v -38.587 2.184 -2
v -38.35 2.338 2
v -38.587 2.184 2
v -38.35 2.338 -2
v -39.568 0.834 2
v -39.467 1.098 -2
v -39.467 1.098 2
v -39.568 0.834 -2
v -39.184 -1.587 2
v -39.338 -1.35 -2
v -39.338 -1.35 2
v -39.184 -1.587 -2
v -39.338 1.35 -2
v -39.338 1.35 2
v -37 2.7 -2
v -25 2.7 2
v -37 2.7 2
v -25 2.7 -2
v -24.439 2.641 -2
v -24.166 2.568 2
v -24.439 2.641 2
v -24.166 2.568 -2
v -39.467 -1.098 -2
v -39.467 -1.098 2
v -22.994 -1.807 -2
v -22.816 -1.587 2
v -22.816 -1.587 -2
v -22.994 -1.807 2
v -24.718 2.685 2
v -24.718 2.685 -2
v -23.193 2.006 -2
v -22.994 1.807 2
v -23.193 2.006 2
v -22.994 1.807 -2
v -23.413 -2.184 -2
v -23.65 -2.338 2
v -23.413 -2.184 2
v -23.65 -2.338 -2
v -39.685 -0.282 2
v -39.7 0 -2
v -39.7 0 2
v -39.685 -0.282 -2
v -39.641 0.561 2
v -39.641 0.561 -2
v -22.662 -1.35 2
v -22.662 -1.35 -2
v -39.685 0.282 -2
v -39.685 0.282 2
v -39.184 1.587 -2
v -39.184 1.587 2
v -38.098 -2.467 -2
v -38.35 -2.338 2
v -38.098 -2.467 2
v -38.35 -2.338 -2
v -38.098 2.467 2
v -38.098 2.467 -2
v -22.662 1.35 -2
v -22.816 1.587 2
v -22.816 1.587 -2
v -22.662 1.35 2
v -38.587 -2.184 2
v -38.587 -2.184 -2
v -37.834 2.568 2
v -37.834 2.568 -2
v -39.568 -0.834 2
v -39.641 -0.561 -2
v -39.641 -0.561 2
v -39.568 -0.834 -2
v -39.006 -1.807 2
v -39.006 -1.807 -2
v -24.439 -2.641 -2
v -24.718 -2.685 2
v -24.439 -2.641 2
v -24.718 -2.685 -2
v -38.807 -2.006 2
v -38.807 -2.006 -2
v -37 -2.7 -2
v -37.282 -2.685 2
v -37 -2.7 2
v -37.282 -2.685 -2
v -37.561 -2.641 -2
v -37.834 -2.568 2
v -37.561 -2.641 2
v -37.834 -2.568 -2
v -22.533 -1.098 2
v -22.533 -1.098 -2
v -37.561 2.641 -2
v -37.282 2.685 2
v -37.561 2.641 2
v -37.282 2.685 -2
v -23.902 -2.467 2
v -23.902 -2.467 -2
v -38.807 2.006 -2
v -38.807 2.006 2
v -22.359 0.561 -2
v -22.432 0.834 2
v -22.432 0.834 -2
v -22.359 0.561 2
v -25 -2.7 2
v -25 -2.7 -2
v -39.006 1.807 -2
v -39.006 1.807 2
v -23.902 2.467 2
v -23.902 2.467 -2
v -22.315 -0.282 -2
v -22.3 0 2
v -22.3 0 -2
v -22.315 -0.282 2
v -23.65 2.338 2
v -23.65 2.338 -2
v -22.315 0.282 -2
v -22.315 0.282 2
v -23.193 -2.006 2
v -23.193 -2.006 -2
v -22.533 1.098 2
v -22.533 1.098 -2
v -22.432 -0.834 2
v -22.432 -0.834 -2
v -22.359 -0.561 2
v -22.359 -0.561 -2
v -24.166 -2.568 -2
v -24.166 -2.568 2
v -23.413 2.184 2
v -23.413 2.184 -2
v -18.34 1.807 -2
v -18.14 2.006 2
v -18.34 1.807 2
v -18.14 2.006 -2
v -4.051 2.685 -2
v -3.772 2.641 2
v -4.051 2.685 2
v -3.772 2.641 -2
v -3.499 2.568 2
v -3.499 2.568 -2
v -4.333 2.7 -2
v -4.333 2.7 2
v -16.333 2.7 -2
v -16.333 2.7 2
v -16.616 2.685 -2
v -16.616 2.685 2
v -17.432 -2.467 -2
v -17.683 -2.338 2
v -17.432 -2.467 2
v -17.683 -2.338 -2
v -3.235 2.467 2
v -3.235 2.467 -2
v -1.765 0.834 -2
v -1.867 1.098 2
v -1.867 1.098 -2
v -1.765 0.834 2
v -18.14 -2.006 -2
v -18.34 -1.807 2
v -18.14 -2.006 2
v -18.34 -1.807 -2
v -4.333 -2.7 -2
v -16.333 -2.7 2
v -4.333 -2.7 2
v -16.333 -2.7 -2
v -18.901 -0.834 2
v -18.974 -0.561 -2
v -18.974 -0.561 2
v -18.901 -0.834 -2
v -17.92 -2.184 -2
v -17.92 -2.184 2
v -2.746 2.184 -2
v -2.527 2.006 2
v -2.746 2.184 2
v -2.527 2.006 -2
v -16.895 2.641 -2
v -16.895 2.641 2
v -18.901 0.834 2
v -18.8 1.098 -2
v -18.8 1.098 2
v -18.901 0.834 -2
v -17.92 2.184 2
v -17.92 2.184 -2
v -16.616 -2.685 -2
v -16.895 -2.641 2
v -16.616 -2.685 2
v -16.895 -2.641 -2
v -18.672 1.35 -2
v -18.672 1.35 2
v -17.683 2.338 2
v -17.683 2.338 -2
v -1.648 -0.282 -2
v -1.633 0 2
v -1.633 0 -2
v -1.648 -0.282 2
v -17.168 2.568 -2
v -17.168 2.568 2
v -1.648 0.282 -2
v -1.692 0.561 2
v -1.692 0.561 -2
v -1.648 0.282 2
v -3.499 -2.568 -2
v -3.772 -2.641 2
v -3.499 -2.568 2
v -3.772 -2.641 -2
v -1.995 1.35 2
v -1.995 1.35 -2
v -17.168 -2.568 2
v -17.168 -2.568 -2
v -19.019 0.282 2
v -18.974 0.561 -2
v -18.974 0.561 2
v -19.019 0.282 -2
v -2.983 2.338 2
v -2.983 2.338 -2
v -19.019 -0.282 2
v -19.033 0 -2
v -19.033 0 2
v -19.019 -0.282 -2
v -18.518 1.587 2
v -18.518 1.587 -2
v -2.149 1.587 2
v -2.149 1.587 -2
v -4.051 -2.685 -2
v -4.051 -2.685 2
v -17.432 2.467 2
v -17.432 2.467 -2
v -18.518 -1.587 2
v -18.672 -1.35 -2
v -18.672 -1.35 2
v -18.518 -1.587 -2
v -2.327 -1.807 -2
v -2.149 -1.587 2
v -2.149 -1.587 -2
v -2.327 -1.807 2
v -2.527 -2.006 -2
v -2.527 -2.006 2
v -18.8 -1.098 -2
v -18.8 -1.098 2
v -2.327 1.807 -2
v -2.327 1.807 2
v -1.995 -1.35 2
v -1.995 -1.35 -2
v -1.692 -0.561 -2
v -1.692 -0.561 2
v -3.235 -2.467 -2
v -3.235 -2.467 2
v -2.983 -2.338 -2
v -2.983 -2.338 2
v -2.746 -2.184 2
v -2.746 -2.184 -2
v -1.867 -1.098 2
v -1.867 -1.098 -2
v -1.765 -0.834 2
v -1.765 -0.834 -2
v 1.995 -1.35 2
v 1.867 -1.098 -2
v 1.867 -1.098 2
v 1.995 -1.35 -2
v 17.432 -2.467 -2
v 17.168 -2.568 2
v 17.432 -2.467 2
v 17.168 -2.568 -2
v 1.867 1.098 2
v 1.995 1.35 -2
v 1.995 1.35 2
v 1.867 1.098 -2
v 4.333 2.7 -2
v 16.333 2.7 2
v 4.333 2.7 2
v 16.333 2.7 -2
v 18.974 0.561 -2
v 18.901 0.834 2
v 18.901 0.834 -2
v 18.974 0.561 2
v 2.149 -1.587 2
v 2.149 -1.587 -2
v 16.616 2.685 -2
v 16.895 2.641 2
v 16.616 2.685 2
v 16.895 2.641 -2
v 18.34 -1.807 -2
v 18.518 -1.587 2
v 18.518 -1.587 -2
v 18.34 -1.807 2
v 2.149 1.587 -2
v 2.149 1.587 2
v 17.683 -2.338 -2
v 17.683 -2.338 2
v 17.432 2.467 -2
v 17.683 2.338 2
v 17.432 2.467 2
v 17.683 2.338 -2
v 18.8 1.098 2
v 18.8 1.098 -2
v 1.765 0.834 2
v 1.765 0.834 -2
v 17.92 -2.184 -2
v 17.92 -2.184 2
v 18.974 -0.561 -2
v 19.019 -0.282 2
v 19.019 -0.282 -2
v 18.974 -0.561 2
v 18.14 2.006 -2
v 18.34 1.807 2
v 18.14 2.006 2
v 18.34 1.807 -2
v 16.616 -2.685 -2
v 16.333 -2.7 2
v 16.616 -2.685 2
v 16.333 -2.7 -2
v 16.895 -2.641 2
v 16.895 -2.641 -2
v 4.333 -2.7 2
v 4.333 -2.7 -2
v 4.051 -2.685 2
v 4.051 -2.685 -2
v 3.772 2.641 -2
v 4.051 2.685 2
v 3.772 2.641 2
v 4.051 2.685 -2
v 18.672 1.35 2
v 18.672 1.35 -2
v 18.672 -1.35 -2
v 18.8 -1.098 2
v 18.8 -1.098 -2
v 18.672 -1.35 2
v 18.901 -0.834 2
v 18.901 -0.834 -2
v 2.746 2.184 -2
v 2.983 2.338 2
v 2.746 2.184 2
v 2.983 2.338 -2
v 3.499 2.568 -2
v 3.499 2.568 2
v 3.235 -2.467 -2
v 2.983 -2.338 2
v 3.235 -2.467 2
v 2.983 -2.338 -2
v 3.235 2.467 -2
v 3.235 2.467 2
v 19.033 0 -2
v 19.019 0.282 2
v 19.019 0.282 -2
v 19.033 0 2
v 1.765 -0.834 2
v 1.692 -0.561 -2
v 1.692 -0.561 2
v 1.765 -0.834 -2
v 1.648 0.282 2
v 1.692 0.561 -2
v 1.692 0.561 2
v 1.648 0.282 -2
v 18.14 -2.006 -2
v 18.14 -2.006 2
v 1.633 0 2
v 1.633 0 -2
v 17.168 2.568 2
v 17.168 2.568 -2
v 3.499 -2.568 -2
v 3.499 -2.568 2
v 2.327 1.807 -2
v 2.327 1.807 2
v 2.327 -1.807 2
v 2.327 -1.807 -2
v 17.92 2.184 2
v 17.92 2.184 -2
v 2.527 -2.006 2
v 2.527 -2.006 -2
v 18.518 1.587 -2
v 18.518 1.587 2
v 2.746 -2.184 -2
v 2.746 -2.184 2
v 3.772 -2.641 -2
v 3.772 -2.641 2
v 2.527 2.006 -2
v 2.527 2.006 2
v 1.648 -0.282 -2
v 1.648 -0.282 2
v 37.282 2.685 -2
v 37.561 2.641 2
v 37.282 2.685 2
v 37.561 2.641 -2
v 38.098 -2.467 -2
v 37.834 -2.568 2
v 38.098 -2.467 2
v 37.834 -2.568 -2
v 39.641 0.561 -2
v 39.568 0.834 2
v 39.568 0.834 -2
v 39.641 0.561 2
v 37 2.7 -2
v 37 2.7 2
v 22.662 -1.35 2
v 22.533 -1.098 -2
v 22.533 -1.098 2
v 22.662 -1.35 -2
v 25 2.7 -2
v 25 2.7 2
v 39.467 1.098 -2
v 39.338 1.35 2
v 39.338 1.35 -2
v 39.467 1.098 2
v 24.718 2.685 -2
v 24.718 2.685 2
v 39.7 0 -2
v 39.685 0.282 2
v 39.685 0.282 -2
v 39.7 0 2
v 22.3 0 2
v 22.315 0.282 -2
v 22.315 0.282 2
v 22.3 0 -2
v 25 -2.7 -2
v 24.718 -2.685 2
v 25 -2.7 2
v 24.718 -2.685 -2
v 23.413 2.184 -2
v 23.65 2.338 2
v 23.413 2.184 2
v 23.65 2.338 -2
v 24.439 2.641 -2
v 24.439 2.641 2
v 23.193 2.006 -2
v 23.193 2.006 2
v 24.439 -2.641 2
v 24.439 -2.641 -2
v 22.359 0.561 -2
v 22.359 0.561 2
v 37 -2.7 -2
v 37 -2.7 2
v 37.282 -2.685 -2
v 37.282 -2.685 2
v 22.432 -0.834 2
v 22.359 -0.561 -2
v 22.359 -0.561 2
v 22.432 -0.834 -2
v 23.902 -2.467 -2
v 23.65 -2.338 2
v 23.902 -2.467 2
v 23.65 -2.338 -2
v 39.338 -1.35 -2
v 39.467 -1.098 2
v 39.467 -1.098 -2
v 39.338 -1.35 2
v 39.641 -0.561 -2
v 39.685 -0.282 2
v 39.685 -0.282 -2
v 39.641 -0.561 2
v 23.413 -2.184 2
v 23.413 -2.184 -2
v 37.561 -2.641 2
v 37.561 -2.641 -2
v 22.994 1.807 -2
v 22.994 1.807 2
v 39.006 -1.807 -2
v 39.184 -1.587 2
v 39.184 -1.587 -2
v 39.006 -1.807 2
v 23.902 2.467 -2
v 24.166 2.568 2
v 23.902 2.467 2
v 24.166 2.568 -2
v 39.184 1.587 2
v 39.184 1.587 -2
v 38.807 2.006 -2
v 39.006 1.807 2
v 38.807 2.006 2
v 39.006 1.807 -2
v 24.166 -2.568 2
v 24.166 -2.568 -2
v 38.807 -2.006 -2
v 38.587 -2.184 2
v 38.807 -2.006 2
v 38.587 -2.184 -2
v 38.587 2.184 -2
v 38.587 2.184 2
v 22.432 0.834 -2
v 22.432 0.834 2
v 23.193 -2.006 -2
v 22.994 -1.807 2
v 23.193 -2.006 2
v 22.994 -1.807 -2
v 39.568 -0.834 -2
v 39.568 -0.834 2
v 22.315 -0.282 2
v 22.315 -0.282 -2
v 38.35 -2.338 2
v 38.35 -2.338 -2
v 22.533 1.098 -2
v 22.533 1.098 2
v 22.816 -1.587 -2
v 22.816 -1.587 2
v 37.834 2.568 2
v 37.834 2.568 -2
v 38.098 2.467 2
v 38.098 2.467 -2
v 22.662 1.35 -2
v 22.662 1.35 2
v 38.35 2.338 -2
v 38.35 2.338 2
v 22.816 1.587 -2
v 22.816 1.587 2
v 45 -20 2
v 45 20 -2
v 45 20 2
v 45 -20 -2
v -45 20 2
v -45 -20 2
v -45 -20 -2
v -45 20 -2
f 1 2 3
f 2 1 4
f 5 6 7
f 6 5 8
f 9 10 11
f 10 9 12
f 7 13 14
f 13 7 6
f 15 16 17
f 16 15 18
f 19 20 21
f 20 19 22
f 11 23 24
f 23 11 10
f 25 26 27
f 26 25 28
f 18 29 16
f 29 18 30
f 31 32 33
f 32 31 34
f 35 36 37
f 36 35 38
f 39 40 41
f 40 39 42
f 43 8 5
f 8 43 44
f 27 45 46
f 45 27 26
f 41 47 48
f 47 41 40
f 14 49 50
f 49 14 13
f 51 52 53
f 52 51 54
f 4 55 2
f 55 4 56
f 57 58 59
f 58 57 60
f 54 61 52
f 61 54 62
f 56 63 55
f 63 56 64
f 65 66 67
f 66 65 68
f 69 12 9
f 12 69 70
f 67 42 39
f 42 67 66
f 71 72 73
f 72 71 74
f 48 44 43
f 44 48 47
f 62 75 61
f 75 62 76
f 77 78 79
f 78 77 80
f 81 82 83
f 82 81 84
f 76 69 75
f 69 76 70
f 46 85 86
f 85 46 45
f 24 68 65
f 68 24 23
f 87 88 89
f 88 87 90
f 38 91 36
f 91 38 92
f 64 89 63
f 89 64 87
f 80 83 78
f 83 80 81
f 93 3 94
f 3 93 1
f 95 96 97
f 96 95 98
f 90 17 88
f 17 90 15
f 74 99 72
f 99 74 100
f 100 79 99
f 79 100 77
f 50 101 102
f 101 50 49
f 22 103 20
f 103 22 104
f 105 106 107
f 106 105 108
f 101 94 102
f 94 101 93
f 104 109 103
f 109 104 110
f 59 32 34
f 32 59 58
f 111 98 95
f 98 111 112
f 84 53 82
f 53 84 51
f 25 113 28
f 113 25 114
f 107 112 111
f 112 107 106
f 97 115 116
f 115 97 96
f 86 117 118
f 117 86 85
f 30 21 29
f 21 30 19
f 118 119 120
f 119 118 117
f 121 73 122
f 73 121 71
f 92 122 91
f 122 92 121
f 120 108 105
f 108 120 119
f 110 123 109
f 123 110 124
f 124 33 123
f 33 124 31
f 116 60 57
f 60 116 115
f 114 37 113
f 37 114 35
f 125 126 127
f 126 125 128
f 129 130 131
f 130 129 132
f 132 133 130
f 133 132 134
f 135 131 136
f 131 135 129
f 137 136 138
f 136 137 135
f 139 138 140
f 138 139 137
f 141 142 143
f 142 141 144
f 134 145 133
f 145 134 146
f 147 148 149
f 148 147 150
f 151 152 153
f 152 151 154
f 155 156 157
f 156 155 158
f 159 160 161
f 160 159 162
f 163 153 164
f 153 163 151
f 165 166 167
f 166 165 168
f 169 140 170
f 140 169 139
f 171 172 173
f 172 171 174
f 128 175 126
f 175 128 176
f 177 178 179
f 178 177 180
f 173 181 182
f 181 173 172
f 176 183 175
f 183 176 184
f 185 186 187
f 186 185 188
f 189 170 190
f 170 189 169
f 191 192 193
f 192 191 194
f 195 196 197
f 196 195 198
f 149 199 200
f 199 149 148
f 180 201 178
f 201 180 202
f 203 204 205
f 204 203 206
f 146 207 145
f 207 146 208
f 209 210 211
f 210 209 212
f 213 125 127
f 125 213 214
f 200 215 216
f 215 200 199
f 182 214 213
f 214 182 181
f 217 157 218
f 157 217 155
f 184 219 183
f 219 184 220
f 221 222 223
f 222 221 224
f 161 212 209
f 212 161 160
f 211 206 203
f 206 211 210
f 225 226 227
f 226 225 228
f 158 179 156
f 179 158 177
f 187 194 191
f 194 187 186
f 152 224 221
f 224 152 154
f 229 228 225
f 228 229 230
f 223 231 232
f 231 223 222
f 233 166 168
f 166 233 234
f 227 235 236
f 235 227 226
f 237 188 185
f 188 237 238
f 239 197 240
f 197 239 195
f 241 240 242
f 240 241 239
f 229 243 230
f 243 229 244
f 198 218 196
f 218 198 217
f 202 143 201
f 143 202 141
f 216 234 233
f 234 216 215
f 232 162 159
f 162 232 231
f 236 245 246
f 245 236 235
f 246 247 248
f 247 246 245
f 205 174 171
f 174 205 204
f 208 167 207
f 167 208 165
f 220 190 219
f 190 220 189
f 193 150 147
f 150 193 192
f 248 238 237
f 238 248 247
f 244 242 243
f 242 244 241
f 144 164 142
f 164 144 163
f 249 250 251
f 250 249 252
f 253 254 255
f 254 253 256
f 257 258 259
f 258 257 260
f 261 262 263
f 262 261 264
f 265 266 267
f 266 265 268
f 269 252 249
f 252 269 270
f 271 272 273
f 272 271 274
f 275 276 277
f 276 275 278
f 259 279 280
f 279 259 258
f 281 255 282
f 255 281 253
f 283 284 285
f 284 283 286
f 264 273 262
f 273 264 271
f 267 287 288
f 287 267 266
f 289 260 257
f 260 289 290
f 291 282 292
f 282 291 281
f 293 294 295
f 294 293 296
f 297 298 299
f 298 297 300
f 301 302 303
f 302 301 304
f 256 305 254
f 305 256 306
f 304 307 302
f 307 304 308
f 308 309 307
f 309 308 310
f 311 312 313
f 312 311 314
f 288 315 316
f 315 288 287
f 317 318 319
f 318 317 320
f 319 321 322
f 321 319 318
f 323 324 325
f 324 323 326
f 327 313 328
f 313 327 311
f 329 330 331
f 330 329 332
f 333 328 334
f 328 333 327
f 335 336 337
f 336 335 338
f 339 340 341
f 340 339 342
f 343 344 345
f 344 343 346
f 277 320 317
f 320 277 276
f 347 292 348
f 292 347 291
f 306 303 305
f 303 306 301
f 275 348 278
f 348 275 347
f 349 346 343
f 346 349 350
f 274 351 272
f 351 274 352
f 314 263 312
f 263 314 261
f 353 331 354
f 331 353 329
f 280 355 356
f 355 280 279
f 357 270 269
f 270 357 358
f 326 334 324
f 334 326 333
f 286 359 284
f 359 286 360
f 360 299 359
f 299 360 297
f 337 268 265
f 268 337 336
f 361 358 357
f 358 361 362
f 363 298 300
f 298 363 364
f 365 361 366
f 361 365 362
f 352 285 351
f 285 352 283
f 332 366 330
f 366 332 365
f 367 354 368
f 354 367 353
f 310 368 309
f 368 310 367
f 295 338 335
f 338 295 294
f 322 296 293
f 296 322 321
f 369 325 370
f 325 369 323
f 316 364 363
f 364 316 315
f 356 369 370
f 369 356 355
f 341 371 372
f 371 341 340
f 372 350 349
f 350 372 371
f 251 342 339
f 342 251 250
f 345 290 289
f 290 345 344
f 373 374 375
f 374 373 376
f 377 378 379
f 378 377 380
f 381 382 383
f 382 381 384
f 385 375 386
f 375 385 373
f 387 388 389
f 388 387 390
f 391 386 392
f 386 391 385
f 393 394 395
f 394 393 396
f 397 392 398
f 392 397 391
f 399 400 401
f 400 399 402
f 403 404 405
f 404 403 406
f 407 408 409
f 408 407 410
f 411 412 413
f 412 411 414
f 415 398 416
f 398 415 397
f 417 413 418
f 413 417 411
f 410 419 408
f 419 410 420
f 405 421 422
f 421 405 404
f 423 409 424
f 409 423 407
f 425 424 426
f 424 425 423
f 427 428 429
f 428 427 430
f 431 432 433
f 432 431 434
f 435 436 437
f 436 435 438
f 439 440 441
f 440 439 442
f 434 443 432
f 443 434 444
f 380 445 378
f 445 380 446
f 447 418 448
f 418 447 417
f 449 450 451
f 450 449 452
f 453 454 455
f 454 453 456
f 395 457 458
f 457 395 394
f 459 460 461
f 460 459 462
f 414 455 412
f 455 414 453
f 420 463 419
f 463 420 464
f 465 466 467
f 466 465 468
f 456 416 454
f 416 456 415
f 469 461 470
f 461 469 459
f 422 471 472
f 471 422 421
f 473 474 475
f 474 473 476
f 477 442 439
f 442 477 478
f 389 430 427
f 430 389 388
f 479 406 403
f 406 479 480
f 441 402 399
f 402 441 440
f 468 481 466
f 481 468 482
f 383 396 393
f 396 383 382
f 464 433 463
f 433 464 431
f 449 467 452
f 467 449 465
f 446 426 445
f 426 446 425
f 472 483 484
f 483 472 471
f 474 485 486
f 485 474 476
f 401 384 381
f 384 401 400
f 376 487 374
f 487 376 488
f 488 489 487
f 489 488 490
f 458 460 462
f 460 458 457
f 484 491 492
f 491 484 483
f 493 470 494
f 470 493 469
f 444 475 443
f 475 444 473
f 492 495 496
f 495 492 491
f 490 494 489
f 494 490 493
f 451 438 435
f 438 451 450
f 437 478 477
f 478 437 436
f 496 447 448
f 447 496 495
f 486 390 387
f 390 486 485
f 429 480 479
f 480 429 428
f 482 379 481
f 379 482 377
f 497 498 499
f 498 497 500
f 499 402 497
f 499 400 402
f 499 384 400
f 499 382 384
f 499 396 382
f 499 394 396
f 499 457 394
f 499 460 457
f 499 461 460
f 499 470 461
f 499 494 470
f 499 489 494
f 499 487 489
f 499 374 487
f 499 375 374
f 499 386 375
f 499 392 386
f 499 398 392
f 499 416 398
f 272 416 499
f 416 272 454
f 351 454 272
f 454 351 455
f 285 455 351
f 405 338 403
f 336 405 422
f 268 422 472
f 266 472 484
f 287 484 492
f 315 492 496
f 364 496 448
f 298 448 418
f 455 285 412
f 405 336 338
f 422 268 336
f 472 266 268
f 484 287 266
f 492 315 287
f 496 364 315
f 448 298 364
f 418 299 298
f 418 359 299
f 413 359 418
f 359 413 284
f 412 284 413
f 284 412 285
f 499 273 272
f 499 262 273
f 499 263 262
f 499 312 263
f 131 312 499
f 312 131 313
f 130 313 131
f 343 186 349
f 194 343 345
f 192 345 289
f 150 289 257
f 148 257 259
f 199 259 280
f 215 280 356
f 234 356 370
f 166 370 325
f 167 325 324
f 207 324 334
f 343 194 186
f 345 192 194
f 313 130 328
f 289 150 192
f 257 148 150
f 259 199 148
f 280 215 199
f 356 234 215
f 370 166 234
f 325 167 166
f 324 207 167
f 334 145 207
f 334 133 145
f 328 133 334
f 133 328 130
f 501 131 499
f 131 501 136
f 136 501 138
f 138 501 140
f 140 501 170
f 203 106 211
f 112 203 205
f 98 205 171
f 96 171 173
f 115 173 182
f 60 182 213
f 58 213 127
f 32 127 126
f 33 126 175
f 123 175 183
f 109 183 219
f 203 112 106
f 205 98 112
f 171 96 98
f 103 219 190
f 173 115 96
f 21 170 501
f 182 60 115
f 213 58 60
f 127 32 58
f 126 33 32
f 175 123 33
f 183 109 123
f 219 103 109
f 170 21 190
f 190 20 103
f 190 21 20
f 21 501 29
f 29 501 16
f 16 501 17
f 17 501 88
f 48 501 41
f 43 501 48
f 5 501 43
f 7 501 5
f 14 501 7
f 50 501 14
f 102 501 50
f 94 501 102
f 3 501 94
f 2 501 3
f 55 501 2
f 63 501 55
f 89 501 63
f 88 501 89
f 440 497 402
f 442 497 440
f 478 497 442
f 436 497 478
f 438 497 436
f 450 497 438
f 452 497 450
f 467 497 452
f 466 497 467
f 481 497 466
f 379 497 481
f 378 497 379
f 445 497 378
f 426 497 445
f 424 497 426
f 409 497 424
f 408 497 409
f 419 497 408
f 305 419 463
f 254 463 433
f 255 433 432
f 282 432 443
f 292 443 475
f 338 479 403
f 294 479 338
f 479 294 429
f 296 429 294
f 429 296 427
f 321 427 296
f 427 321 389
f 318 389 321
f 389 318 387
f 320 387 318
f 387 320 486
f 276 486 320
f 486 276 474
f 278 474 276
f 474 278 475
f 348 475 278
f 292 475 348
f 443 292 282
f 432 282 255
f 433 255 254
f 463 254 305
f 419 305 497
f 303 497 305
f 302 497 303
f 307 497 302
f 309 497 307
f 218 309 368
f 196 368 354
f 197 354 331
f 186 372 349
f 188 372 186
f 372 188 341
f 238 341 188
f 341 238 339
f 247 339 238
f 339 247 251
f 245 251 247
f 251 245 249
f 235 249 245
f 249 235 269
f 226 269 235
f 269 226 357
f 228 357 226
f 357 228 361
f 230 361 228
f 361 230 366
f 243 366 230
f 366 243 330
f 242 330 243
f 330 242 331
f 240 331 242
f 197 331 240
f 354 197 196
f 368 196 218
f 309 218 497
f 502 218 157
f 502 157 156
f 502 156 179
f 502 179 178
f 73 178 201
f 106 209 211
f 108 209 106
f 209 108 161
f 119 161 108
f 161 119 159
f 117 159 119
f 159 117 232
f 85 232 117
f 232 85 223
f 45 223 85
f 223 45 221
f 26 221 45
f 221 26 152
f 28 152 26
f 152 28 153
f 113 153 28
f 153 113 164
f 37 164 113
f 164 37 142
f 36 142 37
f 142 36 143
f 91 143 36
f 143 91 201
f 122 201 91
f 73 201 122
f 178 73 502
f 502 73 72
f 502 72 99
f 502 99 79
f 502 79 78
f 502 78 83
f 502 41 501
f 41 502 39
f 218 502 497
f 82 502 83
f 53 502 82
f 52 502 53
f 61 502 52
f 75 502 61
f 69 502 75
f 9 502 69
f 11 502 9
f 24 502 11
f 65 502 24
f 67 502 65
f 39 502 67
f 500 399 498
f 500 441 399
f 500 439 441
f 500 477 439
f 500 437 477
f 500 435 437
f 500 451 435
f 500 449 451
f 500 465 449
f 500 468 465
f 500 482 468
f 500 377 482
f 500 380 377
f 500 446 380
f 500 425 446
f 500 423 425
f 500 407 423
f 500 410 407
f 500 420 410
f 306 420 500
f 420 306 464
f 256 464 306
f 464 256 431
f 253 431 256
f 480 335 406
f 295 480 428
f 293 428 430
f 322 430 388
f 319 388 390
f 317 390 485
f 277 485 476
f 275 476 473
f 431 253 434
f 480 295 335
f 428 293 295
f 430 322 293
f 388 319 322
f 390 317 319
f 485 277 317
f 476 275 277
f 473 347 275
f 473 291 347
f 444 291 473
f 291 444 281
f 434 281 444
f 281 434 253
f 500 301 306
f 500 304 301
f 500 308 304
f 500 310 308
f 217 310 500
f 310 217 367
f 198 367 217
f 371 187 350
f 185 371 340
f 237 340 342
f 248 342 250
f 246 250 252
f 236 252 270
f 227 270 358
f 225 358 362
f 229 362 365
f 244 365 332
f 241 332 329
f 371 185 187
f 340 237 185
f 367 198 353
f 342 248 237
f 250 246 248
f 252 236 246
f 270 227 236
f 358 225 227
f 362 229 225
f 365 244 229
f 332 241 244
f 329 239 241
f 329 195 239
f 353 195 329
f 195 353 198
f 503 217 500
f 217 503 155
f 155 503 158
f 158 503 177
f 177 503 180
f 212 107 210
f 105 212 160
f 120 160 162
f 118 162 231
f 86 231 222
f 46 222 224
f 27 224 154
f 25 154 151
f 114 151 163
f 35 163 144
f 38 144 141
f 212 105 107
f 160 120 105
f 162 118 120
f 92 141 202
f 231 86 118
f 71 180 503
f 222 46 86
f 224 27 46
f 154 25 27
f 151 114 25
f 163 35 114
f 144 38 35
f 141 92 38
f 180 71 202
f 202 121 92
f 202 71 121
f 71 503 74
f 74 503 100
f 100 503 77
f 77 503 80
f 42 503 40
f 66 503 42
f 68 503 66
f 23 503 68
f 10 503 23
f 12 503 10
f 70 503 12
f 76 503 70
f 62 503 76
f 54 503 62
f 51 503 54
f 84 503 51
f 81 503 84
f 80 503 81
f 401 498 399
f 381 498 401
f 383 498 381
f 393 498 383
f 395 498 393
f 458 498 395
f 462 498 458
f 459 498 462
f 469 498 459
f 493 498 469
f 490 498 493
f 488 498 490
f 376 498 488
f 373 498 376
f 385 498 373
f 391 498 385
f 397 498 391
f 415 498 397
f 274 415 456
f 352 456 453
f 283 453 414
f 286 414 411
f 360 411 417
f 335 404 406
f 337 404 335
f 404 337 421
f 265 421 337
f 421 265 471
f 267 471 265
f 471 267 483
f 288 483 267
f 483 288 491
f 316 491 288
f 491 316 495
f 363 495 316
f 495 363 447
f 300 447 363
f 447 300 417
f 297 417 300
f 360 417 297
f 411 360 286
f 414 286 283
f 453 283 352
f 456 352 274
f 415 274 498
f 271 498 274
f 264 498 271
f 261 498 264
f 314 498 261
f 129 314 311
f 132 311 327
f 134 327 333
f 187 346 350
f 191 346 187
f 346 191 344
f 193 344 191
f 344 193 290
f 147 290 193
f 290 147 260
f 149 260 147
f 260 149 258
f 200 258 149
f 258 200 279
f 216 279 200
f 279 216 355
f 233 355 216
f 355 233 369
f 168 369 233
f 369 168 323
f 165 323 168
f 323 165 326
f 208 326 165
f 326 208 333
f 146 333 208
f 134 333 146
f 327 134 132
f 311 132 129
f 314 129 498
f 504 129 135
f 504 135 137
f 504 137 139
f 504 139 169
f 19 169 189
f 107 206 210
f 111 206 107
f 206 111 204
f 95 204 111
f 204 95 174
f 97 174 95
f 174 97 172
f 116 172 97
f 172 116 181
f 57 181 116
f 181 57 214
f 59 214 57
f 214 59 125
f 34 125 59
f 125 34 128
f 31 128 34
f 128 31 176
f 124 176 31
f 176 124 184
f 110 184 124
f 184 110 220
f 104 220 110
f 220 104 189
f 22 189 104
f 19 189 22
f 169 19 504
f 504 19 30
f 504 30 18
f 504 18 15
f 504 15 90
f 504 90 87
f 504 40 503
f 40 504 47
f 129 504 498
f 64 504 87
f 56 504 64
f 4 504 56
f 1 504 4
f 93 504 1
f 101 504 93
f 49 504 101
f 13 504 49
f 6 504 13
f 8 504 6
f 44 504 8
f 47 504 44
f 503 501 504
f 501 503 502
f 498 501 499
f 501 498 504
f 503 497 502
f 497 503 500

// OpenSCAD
// Slotted mounting plate.
$fn = 60;
eps = 0.02;
plate_l = 90;
plate_w = 40;
plate_t = 4;
slot_l = 12;
slot_d = 5.4;
module slot(x) { hull() { translate([x-slot_l/2,0,-plate_t/2-eps]) cylinder(d=slot_d,h=plate_t+2*eps); translate([x+slot_l/2,0,-plate_t/2-eps]) cylinder(d=slot_d,h=plate_t+2*eps); } }
difference() { cube([plate_l, plate_w, plate_t], center=true); for (i=[0:3]) slot(-plate_l/2+14+i*(plate_l-28)/max(1,3)); }
